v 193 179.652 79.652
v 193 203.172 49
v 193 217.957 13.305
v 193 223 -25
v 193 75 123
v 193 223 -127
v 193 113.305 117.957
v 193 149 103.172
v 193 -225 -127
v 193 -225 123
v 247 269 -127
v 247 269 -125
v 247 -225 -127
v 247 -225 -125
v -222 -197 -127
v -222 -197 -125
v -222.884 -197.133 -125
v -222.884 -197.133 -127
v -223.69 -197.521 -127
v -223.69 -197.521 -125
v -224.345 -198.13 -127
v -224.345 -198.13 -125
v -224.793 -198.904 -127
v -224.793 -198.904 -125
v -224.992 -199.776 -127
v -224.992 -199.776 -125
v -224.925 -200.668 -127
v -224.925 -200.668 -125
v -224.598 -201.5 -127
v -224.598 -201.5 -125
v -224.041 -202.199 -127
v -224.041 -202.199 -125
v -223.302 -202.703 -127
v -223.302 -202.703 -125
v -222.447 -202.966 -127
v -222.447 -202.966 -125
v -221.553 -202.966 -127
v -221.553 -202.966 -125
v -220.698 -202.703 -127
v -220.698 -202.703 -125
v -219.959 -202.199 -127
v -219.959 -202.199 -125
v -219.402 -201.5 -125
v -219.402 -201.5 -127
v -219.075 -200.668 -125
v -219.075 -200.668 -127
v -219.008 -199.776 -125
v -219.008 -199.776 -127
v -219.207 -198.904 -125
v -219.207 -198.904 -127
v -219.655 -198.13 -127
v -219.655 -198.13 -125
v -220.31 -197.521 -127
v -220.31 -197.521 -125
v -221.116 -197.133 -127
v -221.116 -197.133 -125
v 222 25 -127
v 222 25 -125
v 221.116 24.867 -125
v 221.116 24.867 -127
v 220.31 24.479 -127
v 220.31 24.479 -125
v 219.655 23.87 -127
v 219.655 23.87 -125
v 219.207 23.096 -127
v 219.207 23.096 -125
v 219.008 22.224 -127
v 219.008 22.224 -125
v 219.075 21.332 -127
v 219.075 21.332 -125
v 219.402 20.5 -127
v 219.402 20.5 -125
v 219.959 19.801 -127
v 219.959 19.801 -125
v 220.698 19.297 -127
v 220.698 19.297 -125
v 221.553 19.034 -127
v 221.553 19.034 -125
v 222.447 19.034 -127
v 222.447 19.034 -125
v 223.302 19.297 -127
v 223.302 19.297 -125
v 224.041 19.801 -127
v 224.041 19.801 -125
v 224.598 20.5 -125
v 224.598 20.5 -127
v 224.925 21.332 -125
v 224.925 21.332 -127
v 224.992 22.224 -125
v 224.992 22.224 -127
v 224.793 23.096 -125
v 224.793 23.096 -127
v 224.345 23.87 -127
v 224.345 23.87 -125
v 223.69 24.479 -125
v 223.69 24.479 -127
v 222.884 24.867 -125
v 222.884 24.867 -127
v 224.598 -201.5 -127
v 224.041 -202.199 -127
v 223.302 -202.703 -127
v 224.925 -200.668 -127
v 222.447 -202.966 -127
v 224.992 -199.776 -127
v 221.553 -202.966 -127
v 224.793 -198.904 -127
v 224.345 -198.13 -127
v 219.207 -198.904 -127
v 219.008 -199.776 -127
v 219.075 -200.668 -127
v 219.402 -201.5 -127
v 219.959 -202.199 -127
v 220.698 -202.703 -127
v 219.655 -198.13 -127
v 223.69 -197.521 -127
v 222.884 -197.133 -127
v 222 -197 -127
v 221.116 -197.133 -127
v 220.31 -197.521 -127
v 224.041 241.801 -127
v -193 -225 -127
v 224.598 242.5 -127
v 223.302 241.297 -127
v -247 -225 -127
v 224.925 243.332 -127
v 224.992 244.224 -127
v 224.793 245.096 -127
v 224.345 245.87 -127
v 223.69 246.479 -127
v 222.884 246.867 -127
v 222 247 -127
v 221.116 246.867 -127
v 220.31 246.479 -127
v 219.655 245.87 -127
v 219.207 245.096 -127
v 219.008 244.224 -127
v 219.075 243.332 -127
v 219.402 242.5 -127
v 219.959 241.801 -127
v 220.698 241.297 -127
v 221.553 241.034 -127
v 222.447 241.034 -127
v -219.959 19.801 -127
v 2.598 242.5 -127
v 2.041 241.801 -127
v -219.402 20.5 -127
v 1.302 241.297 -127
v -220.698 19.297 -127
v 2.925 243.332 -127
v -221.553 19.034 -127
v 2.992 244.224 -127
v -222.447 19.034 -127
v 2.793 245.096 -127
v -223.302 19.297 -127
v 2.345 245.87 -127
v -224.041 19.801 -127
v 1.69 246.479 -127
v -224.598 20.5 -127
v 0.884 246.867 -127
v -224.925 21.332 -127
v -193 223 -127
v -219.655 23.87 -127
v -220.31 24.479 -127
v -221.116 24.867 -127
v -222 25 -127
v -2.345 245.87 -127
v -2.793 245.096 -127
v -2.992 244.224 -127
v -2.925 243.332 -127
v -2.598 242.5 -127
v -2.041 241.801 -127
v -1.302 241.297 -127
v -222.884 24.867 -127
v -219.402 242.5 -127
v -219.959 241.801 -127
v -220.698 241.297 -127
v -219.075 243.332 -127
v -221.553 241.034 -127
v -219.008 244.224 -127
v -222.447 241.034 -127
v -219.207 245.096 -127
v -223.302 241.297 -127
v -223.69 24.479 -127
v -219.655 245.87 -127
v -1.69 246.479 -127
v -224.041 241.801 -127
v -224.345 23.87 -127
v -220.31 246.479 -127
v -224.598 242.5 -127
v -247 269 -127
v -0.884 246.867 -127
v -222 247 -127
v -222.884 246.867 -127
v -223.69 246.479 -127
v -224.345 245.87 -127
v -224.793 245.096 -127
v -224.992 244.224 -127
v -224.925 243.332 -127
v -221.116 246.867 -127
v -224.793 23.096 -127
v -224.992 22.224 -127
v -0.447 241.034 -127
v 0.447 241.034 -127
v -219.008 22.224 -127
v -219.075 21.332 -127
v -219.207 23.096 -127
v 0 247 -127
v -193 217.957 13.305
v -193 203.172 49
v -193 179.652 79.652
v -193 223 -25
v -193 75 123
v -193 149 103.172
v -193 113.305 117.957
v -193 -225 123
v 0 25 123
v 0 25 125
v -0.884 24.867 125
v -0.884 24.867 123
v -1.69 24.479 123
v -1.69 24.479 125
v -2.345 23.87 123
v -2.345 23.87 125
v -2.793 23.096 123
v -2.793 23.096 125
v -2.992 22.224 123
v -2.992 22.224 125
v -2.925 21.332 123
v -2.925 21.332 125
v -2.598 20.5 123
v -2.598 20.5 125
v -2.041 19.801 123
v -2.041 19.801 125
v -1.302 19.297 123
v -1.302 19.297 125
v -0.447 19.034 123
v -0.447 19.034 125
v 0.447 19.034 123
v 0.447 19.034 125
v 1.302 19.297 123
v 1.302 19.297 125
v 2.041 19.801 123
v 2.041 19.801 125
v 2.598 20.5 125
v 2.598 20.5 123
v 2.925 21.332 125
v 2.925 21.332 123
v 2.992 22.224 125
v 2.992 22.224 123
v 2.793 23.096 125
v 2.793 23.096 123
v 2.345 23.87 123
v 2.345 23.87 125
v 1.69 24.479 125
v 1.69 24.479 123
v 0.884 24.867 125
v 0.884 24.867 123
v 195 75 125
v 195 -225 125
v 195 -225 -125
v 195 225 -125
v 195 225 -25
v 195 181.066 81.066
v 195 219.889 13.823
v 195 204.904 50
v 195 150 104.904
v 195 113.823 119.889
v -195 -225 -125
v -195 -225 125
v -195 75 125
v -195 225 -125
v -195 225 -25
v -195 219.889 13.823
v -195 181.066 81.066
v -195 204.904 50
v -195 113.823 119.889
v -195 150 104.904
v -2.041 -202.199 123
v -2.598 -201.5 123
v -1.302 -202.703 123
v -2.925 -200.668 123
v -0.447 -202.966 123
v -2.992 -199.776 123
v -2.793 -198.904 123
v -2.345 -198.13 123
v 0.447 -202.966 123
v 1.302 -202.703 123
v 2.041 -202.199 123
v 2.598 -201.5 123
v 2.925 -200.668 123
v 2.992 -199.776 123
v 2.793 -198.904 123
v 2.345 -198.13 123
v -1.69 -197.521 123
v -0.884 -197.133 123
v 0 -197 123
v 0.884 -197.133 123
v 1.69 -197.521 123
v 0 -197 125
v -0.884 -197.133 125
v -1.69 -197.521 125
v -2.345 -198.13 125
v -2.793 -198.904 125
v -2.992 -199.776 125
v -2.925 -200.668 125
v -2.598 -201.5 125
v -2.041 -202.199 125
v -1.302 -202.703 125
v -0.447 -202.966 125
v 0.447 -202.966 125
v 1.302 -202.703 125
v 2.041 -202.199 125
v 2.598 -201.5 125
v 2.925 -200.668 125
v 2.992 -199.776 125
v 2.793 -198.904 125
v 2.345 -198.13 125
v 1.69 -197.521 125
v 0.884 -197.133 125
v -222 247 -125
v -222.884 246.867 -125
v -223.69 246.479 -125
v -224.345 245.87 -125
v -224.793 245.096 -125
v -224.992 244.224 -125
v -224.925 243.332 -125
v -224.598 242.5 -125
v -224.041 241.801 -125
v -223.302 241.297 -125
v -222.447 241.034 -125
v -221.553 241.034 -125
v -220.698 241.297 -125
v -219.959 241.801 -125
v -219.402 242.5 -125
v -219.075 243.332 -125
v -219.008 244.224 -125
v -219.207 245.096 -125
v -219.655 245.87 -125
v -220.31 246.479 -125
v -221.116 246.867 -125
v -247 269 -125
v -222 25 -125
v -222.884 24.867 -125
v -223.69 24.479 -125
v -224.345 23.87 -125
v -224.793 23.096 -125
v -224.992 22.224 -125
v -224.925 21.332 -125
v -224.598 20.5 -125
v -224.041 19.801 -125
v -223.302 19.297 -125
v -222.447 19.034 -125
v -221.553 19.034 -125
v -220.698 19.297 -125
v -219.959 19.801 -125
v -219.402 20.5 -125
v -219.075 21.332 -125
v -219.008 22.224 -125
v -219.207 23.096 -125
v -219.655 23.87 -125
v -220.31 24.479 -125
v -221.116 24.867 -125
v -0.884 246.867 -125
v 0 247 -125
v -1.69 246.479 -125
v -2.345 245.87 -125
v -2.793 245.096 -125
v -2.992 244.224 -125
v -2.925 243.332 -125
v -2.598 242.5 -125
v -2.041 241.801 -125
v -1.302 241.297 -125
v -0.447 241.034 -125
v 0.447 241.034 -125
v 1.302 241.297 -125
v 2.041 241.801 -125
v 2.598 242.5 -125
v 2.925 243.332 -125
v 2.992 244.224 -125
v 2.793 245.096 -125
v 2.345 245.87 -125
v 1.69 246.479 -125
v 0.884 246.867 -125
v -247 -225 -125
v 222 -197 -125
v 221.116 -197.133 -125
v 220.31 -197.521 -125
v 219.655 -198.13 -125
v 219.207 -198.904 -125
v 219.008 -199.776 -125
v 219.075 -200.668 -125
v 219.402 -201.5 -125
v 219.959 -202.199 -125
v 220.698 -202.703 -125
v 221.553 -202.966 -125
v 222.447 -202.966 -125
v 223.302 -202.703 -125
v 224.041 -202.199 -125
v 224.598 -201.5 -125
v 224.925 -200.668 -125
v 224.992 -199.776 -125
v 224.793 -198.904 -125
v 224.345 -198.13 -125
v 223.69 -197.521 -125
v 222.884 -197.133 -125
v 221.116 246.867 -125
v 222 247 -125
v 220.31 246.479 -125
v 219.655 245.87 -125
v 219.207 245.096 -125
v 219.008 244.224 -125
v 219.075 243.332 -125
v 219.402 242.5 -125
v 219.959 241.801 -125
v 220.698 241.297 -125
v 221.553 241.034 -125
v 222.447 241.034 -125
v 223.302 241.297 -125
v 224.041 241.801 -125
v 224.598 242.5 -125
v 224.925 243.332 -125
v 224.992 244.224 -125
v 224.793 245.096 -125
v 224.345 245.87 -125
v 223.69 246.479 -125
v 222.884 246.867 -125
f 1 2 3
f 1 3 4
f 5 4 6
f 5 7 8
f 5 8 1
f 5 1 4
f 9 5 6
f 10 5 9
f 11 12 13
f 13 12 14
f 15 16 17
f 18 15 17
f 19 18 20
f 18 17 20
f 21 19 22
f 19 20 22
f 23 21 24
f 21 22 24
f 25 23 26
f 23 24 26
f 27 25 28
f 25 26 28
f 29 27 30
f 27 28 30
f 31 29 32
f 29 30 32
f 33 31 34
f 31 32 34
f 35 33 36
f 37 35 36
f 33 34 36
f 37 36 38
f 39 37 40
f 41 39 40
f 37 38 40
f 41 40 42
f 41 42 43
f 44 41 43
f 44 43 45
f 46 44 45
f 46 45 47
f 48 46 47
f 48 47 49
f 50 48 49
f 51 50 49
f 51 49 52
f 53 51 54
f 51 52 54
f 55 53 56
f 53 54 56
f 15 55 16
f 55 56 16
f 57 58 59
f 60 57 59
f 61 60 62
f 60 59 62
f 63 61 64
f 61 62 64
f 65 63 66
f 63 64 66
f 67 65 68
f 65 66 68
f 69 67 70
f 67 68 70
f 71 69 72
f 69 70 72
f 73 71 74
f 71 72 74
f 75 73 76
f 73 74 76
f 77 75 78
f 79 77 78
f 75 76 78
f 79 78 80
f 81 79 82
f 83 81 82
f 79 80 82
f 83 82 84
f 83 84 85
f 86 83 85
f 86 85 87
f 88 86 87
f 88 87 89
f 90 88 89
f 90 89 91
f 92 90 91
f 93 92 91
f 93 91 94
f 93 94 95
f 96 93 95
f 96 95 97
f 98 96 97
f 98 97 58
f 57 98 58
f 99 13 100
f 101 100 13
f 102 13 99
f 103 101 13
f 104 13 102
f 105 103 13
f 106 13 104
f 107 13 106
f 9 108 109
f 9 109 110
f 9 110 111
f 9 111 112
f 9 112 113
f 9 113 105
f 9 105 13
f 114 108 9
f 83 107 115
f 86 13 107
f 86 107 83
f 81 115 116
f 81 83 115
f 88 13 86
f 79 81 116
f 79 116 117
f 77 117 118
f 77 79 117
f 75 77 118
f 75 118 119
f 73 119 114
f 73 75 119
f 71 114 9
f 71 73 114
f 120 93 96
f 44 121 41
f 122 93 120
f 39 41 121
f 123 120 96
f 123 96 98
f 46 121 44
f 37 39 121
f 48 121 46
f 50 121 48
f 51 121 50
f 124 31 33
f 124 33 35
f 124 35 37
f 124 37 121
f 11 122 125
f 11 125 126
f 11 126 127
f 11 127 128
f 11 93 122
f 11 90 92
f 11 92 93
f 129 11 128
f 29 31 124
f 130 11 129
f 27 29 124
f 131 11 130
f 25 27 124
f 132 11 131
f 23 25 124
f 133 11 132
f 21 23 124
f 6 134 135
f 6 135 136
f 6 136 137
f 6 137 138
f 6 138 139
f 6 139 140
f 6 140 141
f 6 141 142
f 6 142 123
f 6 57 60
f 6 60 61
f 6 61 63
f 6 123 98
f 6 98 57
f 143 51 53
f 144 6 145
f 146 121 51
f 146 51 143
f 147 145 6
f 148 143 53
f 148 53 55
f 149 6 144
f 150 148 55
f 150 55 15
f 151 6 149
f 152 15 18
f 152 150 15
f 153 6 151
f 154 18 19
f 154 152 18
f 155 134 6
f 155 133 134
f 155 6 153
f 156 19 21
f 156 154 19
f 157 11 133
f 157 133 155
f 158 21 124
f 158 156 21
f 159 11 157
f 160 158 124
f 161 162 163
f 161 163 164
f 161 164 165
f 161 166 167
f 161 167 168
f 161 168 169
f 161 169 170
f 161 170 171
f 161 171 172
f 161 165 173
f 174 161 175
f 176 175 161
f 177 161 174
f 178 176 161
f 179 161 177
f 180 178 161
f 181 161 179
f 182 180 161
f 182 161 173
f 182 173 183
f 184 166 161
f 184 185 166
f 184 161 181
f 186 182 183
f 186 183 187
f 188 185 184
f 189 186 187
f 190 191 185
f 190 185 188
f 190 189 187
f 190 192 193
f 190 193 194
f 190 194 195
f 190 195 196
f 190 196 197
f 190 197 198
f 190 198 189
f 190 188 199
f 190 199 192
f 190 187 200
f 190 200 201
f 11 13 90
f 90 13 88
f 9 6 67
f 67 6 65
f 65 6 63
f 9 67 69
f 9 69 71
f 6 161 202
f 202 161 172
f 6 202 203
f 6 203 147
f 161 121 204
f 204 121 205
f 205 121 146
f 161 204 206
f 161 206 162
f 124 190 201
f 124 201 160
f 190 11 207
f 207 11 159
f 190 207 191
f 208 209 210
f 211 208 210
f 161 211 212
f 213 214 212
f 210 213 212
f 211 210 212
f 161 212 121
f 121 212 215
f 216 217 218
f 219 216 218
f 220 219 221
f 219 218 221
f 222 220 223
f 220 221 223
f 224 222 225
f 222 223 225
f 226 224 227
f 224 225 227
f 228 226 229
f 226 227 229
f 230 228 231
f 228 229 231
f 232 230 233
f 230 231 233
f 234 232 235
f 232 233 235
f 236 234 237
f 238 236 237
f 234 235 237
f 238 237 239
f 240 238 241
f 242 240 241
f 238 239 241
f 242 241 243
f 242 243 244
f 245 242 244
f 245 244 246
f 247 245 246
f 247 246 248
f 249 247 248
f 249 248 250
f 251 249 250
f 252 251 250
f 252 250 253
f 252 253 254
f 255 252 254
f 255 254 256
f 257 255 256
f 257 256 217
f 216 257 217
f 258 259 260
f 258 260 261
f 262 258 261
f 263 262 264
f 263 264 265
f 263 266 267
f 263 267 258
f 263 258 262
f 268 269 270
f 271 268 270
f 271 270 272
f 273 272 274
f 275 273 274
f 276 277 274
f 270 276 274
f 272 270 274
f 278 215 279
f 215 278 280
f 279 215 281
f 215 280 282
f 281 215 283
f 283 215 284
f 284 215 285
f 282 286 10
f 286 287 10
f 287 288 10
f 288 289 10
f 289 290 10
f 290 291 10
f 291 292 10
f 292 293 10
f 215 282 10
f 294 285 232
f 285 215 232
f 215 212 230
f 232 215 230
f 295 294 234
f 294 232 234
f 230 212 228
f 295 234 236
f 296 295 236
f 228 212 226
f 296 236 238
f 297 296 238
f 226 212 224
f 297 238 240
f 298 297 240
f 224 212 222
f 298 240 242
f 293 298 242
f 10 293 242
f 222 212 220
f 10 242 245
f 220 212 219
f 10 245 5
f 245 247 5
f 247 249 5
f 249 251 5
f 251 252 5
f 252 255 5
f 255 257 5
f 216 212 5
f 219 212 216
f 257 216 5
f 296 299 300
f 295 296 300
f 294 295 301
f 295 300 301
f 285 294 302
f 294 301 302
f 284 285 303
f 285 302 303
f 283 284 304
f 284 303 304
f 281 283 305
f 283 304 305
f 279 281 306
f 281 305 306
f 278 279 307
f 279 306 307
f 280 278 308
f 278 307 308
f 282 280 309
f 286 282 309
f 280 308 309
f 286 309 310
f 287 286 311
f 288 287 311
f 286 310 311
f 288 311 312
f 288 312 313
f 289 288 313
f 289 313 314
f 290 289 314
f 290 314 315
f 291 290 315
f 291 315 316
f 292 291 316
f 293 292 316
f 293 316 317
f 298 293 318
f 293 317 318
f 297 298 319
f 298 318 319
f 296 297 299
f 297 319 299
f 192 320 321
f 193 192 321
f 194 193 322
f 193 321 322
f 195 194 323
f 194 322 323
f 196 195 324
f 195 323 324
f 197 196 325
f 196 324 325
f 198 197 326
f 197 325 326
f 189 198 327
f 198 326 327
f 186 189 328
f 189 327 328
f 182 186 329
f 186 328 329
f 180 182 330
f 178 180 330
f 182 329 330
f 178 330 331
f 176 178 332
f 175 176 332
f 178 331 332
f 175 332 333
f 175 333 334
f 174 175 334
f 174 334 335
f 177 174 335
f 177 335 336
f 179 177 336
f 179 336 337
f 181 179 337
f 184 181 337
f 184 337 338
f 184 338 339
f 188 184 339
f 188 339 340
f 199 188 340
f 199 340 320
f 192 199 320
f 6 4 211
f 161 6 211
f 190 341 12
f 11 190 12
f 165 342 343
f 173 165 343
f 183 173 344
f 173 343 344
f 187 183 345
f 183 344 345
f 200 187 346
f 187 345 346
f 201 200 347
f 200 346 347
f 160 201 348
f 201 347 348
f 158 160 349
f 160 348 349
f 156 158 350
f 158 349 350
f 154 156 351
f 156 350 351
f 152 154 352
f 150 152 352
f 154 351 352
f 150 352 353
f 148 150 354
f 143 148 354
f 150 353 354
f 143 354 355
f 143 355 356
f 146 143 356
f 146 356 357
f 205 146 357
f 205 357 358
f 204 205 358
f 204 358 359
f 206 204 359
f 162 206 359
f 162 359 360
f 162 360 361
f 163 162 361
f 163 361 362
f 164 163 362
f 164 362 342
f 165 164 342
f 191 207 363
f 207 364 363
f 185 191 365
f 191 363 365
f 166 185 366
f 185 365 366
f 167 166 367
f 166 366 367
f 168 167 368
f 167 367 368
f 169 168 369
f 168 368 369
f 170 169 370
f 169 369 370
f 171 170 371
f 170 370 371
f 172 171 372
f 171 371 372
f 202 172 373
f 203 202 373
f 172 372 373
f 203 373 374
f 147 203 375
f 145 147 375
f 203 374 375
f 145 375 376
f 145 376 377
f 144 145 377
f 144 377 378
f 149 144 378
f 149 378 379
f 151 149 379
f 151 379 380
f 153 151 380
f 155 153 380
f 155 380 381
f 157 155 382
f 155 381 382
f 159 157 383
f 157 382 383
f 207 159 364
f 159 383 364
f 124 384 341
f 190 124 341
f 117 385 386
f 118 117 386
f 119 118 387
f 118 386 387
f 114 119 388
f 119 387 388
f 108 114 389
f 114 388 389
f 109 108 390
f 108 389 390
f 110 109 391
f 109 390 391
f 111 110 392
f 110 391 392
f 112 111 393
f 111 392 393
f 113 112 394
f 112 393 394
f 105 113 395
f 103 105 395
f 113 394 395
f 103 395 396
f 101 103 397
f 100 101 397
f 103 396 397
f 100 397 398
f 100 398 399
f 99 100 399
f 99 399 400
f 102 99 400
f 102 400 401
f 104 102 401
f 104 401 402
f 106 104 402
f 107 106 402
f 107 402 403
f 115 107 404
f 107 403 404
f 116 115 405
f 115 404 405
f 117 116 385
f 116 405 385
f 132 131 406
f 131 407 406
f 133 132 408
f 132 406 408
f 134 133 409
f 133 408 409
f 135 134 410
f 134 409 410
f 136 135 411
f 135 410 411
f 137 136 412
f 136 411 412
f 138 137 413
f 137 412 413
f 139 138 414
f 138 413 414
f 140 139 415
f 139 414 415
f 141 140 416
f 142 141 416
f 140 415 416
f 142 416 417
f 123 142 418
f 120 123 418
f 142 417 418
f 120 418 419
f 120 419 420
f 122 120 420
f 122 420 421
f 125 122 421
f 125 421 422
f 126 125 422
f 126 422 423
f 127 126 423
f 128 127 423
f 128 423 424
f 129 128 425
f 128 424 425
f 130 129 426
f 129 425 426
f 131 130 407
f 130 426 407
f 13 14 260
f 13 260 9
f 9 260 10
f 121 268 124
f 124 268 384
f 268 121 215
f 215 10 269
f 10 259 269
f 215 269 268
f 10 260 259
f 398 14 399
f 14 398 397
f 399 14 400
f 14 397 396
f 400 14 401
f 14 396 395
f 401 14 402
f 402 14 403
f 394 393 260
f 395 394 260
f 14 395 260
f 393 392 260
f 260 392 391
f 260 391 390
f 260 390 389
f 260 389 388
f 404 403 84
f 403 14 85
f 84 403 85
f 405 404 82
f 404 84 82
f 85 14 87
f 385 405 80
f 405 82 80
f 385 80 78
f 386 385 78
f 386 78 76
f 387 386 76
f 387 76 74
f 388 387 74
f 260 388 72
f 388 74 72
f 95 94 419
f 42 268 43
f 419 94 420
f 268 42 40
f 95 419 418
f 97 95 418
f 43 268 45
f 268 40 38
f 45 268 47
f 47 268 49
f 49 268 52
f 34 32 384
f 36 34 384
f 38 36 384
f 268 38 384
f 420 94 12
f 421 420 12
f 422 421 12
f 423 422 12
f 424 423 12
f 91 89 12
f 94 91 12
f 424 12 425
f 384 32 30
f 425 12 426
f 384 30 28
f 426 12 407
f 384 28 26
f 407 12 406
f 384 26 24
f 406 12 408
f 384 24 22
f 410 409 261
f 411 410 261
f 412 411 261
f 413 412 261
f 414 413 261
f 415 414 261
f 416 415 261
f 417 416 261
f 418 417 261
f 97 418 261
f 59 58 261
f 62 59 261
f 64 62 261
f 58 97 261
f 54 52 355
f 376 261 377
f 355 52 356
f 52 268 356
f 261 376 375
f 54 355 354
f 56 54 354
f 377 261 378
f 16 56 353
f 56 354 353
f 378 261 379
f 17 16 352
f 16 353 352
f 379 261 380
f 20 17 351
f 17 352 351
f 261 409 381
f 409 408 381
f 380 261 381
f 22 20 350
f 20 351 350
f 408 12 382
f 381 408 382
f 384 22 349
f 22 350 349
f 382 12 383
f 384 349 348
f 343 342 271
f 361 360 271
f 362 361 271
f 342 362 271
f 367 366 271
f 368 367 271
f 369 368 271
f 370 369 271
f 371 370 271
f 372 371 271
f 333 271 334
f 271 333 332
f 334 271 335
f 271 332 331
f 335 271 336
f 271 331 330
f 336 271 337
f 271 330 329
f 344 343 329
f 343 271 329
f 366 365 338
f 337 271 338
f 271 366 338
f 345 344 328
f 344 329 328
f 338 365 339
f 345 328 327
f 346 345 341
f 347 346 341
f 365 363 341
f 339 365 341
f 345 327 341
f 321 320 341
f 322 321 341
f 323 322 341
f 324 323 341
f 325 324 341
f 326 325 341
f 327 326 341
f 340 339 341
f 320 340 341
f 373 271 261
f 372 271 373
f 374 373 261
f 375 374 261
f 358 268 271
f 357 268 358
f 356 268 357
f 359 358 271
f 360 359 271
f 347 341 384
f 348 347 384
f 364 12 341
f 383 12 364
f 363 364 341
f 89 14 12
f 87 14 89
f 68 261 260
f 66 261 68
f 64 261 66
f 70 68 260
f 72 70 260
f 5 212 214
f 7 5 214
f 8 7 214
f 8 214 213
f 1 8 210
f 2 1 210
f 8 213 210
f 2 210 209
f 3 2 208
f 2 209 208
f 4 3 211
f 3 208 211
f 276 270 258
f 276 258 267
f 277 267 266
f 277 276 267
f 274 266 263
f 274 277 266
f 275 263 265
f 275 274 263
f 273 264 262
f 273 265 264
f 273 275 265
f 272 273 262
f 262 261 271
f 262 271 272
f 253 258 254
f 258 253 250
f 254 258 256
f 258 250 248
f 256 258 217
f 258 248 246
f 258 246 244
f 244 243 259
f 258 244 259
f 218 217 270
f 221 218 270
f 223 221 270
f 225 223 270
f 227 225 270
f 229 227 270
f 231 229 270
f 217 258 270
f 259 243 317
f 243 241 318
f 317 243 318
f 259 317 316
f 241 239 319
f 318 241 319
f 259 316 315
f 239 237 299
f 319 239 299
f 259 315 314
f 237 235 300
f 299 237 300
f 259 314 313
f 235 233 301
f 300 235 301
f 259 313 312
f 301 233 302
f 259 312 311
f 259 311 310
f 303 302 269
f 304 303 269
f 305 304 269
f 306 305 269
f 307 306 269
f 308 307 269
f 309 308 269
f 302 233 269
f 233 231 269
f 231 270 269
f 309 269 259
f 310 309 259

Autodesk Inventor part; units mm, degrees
ref_plane "YZ Plane" through (0, 0, 0) normal (1, 0, 0) x (0, 1, 0)
ref_plane "XZ Plane" through (0, 0, 0) normal (0, 1, 0) x (-1, 0, 0)
ref_plane "XY Plane" through (0, 0, 0) normal (0, 0, 1) x (1, 0, 0)
sketch "Sketch1" plane through (0, 0, 0) normal (1, 0, 0) x (0, 1, 0)
  line L0 (-225, -125) -> (225, -125)
  line L1 (225, -125) -> (225, -25)
  line L2 (75, 125) -> (-225, 125)
  line L3 (-225, 125) -> (-225, -125)
  line L4 (-225, -125) -> (225, 125) construction
  line L5 (225, -125) -> (-225, 125) construction
  arc A0 (225, -25) -> (75, 125) centre (75, -25) ccw
  point P0 (0, 0)
  dimension "d0" = 450
  dimension "d1" = 250
  dimension "d2" = 150
extrude "Extrusion1" add sketch "Sketch1" along normal mid plane 390
shell "Shell1" thickness 2 removed faces 1 at (65, -75, -125)
sketch "Sketch2" plane through (195, 225, -125) normal (0, 0, -1) x (-1, 0, 0)
  line L0 (2, -448) -> (2, -2) projected
  line L1 (2, -2) -> (388, -2) projected
  line L2 (388, -2) -> (388, -448) projected
  line L3 (388, -2) -> (388, -448)
  line L4 (2, -448) -> (2, -2)
  line L5 (2, -2) -> (388, -2)
  line L6 (442, -450) -> (442, 44)
  line L7 (442, 44) -> (-52, 44)
  line L8 (-52, 44) -> (-52, -450)
  line L9 (0, -450) -> (390, -450) projected
  line L10 (2, -448) -> (2, -450)
  line L11 (388, -448) -> (388, -450)
  line L12 (-52, -450) -> (2, -450)
  line L13 (388, -450) -> (442, -450)
  point P0 (195, -225)
  point P1 (195, -450)
  dimension "d6" = 494
  dimension "d7" = 494
sketch "Sketch3" plane through (-193, -223, -125) normal (0, 1, 0) x (1, 0, 0)
  line L0 (0, 0) -> (386, 0) projected
  line L1 (0, 0) -> (0, -248) projected
  line L2 (0, -248) -> (386, -248) projected
  line L3 (386, -248) -> (386, 0) projected
  point P0 (193, -125)
extrude "Extrusion2" cut sketch "Sketch3" against normal blind 2
extrude "Extrusion3" add sketch "Sketch2" along normal blind 2 contours L10 L9 L12 L8 L7 L6 L13 L11 L2 L1 L0
hole "Hole1" at (-222, 244, -127) direction (0, 0, 1) diameter 6 end through all
pattern_linear "Rectangular Pattern1" count 3 spacing 222 along (1, 0, 0) count 3 spacing 222 along (0, -1, 0) of "Hole1"
properties part number "SidePanelCover-Curved"
